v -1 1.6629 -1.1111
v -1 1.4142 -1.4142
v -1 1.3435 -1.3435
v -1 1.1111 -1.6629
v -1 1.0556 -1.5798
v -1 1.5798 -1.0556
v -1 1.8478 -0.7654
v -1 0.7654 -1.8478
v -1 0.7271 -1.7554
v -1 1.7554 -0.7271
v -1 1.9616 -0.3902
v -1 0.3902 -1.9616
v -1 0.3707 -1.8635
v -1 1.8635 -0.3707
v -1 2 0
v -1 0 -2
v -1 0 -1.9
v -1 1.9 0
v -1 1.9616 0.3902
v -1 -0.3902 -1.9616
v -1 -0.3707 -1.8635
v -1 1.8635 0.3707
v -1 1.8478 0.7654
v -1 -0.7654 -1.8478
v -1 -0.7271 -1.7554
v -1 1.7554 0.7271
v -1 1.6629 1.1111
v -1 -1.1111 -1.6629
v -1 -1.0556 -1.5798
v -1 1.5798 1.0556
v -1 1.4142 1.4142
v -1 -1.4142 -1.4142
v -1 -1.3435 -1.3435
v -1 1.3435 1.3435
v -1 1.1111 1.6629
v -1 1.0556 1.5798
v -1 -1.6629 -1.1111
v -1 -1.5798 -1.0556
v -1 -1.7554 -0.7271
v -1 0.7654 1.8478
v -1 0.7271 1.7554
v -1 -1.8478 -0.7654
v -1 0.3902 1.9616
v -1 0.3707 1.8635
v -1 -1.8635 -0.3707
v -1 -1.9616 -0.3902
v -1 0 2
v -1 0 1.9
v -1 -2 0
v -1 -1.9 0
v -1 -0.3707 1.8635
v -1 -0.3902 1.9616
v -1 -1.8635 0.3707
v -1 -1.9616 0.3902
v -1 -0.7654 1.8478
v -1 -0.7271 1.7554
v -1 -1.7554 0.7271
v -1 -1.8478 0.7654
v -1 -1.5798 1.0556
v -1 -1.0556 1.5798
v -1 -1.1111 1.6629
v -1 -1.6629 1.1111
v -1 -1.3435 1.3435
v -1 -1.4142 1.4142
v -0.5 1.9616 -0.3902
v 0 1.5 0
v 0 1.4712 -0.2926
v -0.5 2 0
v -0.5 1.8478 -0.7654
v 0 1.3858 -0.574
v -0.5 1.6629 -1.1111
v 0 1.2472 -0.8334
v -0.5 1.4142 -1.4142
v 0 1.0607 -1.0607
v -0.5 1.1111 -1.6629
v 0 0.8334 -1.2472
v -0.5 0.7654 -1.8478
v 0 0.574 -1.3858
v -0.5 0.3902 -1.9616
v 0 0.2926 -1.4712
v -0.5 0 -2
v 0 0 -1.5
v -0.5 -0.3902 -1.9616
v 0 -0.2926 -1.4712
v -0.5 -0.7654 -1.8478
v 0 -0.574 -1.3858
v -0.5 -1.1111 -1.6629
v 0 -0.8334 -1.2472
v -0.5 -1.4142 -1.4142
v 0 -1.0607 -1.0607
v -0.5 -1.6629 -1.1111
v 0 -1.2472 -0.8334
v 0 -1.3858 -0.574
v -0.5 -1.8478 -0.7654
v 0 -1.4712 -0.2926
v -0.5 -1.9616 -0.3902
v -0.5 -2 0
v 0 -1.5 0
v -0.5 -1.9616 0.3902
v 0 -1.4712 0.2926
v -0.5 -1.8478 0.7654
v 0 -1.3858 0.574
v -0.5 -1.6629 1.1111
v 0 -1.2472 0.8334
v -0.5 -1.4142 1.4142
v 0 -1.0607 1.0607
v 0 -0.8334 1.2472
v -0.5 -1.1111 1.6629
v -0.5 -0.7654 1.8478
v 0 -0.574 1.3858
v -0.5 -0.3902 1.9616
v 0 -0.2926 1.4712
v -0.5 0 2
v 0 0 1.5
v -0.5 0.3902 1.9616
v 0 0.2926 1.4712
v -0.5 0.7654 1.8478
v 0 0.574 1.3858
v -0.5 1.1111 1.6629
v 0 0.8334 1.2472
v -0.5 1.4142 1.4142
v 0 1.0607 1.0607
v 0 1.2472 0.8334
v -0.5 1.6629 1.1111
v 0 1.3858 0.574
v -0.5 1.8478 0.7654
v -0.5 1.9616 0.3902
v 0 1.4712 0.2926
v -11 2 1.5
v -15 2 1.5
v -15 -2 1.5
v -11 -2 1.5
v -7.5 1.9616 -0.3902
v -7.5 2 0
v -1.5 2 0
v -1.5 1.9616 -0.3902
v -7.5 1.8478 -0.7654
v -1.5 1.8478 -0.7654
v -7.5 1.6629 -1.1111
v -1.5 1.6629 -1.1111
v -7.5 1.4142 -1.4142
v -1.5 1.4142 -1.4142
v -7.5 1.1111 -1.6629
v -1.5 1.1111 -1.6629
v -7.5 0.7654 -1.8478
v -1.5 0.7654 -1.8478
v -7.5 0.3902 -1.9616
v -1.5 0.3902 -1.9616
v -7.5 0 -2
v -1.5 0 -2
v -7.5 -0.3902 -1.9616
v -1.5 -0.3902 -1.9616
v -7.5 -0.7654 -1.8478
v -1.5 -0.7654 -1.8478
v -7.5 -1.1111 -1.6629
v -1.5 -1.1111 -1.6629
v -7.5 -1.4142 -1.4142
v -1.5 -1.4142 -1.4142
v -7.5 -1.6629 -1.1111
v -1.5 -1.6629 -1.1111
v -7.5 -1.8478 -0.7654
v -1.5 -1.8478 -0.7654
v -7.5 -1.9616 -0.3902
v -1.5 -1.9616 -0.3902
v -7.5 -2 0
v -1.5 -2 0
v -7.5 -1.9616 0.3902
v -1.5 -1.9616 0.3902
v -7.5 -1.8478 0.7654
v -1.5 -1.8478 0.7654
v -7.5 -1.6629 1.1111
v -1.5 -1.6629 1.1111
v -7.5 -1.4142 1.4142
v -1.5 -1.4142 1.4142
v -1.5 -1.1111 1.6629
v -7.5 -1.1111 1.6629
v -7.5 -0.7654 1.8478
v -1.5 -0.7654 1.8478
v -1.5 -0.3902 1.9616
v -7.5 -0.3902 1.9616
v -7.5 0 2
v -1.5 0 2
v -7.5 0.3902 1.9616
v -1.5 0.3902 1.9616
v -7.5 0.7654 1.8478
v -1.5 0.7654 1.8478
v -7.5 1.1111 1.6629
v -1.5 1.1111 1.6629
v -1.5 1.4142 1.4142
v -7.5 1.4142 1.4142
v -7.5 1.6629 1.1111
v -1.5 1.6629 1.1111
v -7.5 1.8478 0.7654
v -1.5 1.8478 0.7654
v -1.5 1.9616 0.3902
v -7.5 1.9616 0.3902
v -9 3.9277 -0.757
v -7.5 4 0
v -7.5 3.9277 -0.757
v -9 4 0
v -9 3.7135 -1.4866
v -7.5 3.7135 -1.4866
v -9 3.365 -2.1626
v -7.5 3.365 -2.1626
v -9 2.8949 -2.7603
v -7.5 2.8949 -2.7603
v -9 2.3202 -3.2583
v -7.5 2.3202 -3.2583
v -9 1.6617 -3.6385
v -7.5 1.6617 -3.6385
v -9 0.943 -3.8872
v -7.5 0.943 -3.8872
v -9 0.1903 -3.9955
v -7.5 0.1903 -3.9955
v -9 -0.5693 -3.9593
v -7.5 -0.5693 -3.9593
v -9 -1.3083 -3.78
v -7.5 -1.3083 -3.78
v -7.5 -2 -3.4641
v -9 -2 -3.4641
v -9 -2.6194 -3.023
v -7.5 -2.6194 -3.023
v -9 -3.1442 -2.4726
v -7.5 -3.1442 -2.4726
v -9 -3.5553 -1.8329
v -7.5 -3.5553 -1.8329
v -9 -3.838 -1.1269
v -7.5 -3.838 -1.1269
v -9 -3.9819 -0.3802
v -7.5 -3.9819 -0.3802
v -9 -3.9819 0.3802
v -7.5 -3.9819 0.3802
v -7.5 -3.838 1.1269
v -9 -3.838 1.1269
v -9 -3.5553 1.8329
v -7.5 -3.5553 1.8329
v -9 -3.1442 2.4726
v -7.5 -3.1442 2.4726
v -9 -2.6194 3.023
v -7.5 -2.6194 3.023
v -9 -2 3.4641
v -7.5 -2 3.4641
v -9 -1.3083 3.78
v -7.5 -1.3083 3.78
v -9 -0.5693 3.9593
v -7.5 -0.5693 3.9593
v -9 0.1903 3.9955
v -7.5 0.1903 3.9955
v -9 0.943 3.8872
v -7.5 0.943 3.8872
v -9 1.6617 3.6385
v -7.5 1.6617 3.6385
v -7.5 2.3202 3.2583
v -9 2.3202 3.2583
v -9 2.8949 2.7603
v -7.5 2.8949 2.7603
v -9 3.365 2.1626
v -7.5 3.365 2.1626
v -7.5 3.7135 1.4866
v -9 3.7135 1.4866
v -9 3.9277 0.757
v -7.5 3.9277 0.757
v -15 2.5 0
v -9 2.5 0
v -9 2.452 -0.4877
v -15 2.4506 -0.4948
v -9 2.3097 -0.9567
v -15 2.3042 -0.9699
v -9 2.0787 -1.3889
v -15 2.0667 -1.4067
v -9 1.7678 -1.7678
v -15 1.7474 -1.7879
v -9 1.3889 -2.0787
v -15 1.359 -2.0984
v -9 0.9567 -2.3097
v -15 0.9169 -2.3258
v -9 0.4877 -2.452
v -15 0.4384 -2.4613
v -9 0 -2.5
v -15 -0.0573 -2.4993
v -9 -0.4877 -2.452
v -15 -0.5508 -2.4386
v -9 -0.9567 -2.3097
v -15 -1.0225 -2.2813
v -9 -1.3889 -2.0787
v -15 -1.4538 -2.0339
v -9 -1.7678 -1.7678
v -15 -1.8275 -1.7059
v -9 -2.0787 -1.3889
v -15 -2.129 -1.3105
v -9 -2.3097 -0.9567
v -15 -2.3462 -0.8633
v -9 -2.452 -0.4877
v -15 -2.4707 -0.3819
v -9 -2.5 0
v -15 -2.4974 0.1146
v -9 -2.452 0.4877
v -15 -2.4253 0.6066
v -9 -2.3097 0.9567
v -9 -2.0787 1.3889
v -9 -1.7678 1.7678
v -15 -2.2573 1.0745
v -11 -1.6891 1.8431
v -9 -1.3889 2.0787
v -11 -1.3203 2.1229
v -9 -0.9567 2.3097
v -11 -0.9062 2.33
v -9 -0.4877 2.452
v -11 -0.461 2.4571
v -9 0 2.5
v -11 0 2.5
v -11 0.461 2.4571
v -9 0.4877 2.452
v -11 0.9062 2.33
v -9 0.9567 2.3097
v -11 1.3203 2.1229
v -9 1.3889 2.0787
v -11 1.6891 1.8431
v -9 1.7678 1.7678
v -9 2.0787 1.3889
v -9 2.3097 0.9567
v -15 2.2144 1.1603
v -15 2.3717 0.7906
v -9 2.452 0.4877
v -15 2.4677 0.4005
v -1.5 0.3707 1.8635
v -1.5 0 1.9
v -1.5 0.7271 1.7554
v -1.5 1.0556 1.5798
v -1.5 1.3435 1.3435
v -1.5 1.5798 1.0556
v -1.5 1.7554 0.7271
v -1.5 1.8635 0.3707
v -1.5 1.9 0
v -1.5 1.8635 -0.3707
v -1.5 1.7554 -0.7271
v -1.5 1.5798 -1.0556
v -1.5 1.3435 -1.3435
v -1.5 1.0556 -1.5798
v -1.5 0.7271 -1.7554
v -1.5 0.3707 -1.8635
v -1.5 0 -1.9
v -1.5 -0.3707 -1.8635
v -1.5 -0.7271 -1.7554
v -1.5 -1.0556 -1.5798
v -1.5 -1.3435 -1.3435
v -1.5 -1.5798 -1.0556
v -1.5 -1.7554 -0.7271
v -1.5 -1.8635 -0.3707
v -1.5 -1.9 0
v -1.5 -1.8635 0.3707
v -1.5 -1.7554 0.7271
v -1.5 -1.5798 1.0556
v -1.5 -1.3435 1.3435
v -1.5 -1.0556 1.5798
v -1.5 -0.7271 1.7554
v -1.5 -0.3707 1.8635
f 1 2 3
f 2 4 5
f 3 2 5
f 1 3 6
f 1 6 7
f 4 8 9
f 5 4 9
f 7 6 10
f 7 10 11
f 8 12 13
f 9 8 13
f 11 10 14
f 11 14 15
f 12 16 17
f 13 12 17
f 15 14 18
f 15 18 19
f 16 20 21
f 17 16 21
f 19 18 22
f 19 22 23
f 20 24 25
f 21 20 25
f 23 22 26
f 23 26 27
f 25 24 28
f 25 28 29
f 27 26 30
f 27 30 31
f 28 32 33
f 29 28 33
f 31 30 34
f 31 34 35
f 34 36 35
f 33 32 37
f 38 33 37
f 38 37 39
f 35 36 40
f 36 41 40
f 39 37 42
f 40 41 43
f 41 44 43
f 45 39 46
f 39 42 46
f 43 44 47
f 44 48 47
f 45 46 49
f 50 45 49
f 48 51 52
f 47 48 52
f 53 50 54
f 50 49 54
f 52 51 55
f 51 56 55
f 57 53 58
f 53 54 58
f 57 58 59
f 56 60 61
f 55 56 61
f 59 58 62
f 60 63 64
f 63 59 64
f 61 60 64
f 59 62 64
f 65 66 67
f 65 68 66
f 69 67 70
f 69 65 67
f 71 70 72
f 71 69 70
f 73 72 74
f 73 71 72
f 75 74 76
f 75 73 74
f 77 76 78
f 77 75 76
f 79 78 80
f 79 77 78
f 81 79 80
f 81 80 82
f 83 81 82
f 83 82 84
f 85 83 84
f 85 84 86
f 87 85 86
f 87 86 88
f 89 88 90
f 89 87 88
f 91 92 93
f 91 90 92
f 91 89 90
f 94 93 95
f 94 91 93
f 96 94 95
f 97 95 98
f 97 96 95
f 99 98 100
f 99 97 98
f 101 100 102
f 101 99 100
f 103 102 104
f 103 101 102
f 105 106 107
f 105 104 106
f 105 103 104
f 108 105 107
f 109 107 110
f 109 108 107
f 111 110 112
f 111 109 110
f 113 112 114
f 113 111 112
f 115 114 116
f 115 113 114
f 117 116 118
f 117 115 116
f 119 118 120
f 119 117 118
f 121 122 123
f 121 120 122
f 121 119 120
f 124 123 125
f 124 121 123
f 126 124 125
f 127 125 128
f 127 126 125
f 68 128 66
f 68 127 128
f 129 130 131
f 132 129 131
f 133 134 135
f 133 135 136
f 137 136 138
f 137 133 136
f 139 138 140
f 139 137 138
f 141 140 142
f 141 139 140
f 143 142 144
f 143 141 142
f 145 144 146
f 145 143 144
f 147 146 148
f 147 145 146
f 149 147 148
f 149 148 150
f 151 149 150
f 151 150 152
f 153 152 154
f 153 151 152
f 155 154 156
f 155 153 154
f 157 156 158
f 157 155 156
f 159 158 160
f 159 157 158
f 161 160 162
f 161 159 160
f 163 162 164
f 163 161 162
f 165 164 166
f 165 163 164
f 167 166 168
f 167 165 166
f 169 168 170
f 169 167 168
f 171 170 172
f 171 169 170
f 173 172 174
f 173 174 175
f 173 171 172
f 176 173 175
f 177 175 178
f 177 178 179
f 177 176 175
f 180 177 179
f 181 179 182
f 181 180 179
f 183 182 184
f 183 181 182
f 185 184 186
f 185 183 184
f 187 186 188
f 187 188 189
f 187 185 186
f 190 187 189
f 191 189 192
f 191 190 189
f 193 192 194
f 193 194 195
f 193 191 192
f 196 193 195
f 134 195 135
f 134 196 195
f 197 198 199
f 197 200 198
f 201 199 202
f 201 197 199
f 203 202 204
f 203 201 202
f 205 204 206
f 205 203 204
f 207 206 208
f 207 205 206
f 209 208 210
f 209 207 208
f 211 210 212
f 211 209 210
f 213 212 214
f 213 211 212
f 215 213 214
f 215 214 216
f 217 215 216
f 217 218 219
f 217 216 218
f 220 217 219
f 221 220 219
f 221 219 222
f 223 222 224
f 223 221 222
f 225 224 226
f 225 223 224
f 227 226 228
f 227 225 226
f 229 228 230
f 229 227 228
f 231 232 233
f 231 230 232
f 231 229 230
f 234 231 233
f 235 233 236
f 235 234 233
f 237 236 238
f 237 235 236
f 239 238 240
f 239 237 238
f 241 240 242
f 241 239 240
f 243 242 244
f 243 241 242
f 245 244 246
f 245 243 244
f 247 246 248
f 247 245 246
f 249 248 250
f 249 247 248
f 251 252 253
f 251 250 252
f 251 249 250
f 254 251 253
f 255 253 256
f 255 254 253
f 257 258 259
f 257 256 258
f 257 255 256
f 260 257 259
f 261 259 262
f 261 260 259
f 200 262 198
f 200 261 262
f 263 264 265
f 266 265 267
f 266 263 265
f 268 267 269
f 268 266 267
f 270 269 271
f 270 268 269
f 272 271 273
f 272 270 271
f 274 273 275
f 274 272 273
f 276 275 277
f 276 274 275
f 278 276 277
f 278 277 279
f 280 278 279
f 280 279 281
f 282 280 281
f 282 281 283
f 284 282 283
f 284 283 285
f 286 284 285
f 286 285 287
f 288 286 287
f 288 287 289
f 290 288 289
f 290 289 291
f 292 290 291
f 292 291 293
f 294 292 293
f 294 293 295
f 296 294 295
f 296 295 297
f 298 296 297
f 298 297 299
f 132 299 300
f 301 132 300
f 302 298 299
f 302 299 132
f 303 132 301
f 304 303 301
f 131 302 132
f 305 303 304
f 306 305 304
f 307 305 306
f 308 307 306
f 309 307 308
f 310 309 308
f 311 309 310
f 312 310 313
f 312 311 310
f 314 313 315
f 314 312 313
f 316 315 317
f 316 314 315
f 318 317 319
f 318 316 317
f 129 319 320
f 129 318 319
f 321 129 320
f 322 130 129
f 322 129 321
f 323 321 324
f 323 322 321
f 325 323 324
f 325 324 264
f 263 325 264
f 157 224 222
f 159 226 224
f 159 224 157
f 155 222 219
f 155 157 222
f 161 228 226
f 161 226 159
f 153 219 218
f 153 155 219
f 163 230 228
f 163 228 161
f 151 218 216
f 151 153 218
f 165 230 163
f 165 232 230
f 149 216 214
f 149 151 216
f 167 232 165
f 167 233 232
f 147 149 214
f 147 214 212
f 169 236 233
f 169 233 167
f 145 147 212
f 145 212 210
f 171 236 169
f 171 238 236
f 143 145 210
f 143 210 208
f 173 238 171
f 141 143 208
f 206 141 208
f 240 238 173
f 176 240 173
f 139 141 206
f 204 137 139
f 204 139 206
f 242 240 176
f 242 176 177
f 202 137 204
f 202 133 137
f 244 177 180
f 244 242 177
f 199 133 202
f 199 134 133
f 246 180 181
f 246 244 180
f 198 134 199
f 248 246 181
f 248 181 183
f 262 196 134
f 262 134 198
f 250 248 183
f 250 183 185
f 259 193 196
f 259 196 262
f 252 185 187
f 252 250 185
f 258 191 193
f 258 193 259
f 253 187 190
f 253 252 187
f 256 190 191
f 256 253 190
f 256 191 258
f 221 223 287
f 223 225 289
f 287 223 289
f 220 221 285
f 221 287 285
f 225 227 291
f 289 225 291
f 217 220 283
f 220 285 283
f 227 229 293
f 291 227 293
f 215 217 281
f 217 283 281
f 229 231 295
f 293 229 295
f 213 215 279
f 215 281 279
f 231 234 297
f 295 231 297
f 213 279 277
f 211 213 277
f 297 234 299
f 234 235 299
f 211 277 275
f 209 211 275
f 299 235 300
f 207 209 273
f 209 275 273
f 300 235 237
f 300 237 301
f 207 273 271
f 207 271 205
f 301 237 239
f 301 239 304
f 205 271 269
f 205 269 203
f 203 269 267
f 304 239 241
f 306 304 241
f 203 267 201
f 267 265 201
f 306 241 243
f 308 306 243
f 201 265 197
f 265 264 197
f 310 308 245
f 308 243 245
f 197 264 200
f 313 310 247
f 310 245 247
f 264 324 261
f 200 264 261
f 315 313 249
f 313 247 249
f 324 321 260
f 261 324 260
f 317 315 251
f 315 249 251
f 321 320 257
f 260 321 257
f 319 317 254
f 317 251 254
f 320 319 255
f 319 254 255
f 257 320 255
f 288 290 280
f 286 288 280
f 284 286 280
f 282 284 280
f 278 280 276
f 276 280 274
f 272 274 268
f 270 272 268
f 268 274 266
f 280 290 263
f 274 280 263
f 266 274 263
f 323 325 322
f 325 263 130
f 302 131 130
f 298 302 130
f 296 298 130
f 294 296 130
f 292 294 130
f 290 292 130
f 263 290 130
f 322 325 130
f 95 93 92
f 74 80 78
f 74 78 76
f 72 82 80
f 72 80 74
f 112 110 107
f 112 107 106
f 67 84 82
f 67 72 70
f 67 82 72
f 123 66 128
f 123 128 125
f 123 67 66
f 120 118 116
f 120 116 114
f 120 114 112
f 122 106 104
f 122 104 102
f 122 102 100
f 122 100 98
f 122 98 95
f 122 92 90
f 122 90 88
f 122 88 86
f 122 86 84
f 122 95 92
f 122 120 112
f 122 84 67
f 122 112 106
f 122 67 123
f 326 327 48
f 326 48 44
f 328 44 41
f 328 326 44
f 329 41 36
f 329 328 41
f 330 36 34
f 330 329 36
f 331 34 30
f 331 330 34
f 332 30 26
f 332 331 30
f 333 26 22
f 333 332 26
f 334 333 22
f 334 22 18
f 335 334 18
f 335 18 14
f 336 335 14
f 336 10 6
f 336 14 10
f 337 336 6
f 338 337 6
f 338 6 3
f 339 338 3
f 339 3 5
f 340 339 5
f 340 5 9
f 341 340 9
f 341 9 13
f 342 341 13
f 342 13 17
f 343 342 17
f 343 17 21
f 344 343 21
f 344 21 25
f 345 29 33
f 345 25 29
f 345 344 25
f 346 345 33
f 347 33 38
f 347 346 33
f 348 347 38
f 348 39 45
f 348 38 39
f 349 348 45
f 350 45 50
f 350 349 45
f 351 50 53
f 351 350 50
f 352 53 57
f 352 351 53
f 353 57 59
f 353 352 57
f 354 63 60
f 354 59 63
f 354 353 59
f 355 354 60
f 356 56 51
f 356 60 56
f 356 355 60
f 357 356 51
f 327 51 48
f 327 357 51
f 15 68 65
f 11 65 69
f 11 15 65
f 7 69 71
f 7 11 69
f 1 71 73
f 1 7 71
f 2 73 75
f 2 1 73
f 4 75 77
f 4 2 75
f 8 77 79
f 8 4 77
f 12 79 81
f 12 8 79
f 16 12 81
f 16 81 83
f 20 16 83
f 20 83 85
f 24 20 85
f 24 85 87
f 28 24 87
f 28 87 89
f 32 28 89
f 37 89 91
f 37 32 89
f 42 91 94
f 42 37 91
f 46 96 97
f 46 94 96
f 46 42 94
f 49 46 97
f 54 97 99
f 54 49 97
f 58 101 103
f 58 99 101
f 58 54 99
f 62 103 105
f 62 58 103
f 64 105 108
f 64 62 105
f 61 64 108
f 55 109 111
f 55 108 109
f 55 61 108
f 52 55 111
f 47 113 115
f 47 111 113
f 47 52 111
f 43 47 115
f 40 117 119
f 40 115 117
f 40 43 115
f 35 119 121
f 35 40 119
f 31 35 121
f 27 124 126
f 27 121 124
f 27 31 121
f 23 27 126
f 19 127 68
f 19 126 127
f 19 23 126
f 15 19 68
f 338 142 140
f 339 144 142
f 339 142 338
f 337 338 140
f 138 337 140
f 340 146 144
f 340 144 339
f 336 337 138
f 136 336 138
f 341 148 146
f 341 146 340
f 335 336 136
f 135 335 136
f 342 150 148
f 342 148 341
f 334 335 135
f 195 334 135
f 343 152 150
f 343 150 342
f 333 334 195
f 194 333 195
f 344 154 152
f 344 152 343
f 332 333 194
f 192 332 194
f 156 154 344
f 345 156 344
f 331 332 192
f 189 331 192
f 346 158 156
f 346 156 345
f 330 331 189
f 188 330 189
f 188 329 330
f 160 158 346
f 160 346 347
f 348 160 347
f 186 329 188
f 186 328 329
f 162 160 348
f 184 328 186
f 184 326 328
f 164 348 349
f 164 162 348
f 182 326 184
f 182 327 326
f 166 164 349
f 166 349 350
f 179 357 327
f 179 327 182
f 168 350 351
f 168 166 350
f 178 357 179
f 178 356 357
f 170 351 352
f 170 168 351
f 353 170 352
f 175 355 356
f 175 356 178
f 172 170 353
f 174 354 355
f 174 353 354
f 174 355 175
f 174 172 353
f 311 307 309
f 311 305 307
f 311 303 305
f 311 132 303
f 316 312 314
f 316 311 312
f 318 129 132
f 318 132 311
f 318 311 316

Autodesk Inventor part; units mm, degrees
ref_plane "YZ Plane" through (0, 0, 0) normal (1, 0, 0) x (0, 1, 0)
ref_plane "XZ Plane" through (0, 0, 0) normal (0, 1, 0) x (-1, 0, 0)
ref_plane "XY Plane" through (0, 0, 0) normal (0, 0, 1) x (1, 0, 0)
sketch "Skizze1" plane through (0, 0, 0) normal (0, 0, 1) x (1, 0, 0)
  line L0 (-18, 0) -> (3, 0) projected
  line L1 (0, -0.8) -> (0, 4.8) projected
  line L2 (0, 2) -> (-7.5, 2)
  line L3 (-7.5, 2) -> (-7.5, 4)
  line L4 (-7.5, 4) -> (-9, 4)
  line L5 (-9, 4) -> (-9, 2.5)
  line L6 (-9, 2.5) -> (-15, 2.5)
  line L7 (-15, 2.5) -> (-15, 0)
  line L8 (-15, 0) -> (0, 0)
  line L9 (0, 0) -> (0, 2)
  dimension "d0" = 4
  dimension "d1" = 8
  dimension "d2" = 5
  dimension "d3" = 7.5
  dimension "d4" = 1.5
  dimension "d5" = 6
revolve "Umdrehung1" add sketch "Skizze1" angle 360 about axis through (-10, 0, 0) along (1, 0, 0)
sketch "Skizze2" plane through (-15, 0, 0) normal (-1, 0, 0) x (0, 0, 1)
  circle A0 centre (0, 0) radius 2.5 projected
  line L0 (1.5, 2) -> (1.5, -2)
  dimension "d7" = 1
extrude "Extrusion1" cut sketch "Skizze2" against normal blind 4 contours A0 L0 picked at (1.6398, 0.534)
sketch "Skizze3" plane through (0, 0, 0) normal (0, 1, 0) x (-1, 0, 0)
  line L0 (1.5, 2) -> (1, 2)
  line L1 (1, 2) -> (1, 1.9)
  line L2 (1, 1.9) -> (1.5, 1.9)
  line L3 (1.5, 1.9) -> (1.5, 2)
  line L4 (2.4, 0) -> (-0.4, 0) projected
  line L5 (0, -0.4) -> (0, 2.4) projected
  point P0 (0, 0)
  dimension "d10" = 3.8
  dimension "d11" = 1.5
  dimension "d12" = 0.5
  dimension "d13" = 4
revolve "Umdrehung2" cut sketch "Skizze3" angle 360 about axis through (-10, 0, 0) along (1, 0, 0)
chamfer "Fase1" distance 0.5 angle 45 1 edges at (0, -2, 0)
properties part number "13_1087_016"
